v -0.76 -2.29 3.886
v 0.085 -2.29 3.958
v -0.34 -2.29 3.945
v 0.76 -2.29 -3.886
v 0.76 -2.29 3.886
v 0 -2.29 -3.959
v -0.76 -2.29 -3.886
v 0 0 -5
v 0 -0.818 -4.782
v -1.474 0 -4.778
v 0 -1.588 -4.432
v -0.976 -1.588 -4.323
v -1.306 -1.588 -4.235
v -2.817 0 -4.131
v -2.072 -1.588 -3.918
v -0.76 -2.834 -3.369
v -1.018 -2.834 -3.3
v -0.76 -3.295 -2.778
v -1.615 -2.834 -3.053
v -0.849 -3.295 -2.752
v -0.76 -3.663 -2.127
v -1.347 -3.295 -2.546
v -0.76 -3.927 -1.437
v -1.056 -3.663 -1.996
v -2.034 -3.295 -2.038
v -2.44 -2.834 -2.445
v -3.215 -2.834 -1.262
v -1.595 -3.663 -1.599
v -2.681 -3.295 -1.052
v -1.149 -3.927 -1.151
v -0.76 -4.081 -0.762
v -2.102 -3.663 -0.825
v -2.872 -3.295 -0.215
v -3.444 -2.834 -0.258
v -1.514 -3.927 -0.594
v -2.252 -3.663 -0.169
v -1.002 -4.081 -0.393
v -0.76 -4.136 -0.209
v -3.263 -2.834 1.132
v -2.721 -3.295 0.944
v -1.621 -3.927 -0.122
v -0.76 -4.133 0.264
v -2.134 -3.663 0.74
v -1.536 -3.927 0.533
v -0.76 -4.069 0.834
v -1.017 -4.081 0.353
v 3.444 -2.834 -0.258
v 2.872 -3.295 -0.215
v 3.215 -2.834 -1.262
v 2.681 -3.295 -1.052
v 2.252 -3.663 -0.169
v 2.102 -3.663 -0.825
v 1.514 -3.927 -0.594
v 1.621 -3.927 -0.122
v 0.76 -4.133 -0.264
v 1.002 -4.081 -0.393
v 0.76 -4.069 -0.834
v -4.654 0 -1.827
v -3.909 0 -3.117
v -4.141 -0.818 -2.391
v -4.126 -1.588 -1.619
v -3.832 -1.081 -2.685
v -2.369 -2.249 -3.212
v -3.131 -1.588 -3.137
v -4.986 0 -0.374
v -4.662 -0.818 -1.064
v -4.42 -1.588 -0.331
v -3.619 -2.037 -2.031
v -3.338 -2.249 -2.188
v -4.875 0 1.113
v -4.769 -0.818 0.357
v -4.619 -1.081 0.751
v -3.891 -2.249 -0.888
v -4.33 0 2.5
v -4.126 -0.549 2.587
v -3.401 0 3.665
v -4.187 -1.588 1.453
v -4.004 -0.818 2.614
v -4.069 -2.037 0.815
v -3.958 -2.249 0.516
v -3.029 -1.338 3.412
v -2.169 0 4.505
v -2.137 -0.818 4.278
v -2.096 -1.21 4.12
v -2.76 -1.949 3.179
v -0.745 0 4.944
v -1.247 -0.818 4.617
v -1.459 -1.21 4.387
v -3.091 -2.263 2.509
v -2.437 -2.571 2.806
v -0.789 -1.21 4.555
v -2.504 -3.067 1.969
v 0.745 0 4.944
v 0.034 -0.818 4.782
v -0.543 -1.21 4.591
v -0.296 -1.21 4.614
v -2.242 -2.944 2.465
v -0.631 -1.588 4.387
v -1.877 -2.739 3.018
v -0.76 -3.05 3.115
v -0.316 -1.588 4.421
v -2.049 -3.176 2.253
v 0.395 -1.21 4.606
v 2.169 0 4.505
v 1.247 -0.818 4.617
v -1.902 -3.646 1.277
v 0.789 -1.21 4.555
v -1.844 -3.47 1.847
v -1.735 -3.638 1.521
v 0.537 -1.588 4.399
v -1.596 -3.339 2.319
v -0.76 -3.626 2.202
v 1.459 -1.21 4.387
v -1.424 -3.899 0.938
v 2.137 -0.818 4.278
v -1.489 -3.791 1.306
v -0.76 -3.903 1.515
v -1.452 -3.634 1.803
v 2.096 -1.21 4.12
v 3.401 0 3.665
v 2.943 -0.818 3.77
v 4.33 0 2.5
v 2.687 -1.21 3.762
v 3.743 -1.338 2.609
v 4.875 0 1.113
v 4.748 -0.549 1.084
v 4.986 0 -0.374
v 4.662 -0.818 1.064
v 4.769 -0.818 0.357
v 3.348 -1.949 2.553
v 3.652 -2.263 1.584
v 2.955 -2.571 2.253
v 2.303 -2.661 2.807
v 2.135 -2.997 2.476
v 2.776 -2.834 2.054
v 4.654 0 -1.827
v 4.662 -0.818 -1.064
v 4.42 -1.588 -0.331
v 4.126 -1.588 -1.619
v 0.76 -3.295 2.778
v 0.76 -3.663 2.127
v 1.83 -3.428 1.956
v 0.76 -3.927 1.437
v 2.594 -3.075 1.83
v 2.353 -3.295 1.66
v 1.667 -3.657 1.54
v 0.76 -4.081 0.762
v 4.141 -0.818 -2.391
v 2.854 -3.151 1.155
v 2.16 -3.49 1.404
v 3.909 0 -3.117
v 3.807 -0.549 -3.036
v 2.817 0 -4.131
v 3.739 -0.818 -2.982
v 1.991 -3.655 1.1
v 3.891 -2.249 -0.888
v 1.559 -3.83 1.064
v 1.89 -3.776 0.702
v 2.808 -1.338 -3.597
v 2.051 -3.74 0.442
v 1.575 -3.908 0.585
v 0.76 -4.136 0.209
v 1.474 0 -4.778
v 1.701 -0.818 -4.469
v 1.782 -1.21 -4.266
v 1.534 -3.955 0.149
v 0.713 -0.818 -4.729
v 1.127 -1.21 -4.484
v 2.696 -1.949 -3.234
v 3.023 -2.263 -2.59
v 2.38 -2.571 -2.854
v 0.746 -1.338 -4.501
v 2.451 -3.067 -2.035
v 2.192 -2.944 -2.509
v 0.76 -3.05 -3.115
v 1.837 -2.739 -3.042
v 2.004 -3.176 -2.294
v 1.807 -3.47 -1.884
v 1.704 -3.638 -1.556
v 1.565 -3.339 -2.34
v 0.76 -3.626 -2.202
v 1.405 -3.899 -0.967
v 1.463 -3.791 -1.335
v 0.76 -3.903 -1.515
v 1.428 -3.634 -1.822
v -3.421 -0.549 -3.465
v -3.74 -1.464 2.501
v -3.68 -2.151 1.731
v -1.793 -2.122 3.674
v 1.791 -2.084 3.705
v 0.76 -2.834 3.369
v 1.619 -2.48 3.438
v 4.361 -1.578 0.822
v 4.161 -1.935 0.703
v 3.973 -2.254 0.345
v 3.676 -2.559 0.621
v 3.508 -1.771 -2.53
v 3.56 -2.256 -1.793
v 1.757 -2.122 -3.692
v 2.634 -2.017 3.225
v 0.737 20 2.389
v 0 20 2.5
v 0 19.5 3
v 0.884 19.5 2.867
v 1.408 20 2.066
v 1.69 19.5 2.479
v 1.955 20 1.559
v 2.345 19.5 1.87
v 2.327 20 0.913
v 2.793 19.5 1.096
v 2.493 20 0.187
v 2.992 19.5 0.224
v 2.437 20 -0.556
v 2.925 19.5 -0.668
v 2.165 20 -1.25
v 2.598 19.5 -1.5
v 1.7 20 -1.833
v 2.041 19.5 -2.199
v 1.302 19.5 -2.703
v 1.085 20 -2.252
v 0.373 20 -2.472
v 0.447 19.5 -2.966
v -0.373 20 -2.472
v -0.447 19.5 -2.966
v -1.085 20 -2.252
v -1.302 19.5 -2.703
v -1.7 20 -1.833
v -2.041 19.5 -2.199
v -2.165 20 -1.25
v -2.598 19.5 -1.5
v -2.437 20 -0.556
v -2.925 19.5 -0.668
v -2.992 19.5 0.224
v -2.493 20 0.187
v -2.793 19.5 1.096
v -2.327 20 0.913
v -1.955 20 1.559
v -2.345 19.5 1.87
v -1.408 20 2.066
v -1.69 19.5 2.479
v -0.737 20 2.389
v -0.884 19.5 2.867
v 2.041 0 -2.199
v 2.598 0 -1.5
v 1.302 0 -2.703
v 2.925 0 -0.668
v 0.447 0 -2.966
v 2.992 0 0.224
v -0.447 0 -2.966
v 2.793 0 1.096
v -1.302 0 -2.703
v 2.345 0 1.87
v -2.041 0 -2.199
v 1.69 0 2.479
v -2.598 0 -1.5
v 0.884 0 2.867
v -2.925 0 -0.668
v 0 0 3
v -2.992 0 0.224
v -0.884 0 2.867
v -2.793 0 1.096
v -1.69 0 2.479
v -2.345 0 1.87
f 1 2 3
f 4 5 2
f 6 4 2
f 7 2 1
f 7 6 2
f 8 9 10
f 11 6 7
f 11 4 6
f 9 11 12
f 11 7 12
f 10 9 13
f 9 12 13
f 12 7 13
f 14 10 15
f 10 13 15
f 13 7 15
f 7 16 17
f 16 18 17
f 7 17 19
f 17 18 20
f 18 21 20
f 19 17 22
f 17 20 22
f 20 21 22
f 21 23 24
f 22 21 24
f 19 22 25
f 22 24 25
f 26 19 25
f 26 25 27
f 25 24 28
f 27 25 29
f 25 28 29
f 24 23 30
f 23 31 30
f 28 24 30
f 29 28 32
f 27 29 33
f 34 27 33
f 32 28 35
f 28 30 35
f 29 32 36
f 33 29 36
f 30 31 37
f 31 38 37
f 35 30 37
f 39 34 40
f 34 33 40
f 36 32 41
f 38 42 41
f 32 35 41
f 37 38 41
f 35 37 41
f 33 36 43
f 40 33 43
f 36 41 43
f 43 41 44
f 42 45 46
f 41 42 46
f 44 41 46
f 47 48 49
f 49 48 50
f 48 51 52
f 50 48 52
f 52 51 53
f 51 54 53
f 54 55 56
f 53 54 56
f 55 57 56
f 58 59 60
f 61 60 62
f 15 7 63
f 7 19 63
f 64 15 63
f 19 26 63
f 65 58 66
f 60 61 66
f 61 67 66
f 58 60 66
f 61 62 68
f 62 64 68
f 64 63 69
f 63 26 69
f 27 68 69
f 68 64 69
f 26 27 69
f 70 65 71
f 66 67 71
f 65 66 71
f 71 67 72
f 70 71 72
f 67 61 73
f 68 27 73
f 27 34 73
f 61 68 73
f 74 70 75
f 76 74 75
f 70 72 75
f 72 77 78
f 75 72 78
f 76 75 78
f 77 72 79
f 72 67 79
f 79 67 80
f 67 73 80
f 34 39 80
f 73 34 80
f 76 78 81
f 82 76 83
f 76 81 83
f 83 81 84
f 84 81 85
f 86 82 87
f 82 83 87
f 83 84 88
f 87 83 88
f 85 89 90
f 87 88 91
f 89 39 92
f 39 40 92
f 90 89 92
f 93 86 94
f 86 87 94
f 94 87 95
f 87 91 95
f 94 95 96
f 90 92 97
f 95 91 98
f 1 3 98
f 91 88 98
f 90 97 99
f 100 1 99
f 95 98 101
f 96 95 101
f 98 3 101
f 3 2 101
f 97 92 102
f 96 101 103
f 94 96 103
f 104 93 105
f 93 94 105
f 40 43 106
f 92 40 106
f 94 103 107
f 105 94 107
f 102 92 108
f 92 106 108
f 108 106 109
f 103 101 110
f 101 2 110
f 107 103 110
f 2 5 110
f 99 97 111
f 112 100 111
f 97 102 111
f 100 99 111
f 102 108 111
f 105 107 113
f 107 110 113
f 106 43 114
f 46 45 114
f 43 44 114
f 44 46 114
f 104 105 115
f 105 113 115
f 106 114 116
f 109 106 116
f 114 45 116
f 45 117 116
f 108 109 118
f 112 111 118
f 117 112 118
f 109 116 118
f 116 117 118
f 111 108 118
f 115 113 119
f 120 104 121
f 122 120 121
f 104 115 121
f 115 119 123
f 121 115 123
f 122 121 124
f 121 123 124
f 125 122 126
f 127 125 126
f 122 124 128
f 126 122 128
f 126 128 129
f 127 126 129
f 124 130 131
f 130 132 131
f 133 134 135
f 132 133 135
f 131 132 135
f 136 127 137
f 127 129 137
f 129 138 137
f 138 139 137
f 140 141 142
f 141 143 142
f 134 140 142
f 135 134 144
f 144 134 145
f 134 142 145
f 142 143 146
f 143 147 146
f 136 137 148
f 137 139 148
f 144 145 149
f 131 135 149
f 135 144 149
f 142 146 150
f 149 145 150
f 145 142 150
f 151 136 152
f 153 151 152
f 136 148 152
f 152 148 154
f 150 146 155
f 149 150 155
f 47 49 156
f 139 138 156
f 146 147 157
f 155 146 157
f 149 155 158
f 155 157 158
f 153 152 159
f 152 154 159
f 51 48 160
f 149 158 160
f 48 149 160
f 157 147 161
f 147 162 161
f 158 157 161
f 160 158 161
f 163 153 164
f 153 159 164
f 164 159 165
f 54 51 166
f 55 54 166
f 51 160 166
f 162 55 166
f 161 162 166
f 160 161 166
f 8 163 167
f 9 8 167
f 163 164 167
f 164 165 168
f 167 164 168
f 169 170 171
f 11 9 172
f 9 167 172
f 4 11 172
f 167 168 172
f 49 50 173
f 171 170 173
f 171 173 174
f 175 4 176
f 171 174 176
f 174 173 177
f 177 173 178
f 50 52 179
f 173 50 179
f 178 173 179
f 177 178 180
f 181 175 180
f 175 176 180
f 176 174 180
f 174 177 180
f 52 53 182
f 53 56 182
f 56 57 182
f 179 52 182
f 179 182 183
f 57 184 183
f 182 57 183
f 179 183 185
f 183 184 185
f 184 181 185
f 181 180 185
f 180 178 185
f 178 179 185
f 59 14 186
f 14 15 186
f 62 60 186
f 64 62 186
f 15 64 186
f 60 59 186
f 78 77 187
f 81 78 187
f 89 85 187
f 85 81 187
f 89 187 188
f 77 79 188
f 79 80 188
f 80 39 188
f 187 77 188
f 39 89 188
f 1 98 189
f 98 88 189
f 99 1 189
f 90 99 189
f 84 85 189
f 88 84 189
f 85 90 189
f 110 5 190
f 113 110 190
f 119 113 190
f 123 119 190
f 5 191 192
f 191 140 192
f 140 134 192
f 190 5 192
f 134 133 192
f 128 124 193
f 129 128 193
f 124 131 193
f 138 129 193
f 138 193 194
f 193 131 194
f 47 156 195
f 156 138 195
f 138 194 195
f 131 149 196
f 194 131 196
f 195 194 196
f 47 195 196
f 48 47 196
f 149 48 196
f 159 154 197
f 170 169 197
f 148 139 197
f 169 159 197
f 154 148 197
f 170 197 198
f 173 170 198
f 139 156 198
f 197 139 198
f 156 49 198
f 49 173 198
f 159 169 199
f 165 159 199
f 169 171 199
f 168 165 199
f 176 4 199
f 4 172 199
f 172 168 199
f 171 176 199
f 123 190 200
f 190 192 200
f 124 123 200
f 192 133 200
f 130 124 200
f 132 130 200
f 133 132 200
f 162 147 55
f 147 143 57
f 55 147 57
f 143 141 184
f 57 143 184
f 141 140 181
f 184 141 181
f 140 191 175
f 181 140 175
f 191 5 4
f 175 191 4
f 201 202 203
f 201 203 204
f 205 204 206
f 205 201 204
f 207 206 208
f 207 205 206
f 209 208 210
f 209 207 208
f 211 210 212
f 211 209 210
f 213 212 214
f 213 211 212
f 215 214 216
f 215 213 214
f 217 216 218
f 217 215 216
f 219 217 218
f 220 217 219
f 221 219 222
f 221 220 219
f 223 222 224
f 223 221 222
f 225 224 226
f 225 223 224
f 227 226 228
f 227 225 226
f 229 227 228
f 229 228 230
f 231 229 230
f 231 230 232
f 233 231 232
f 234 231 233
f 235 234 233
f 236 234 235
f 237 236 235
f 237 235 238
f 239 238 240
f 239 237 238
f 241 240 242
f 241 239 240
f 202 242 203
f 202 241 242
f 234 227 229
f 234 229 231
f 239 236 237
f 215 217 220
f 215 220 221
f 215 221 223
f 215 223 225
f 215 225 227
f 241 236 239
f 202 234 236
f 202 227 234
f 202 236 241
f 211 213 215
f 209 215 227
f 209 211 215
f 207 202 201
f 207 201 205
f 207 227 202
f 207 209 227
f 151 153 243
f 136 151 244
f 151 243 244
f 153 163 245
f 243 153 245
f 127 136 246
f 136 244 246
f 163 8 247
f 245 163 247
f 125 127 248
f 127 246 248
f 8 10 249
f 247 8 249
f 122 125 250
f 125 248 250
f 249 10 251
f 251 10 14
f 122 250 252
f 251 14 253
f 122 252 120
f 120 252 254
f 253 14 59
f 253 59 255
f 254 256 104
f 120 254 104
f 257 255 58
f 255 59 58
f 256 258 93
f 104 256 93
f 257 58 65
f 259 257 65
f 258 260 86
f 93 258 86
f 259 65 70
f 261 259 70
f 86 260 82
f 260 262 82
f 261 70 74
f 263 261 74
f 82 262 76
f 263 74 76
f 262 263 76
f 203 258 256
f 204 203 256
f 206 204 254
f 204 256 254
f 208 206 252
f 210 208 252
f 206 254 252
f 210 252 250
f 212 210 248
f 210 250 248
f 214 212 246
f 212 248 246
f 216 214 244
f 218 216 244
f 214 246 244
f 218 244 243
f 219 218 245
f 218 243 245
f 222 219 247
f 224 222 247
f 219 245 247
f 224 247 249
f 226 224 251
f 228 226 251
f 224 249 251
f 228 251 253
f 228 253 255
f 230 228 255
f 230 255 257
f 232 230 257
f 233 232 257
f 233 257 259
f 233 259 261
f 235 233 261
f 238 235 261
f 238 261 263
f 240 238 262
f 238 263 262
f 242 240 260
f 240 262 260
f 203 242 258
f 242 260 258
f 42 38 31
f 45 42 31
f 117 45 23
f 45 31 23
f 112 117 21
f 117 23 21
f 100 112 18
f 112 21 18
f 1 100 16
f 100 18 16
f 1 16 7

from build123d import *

# Parameters (mm, degrees)
SKETCH1_R               = 3
BOSS_EXTRUDE1_DEPTH     = 20
CHAMFER1_SIZE           = 0.5
CUT_EXTRUDE1_DEPTH      = 22.213203483
CUT_EXTRUDE1_DEPTH_BACK = 22.213203483


with BuildPart() as part:
    # Sketch1 → Boss-Extrude1 (new body)
    with BuildSketch(Plane(origin=(0, 0, 0), x_dir=(1, 0, 0), z_dir=(0, 1, 0))):
        with Locations(Location((0, 0, 0), (0, 0, 270))):
            Circle(SKETCH1_R)
    extrude(amount=BOSS_EXTRUDE1_DEPTH)

    # Chamfer1
    chamfer1_edges = [part.edges().sort_by_distance(p)[0] for p in [
        (0, 20, -3),
    ]]
    chamfer(chamfer1_edges, length=CHAMFER1_SIZE)

    # Sketch2 → Revolve1 (revolve)
    with BuildSketch(Plane.XY, mode=Mode.PRIVATE) as revolve1_sk:
        with BuildLine():
            Line((0, 0), (-5, 0))
            ThreePointArc((-5, 0), (-3.260312474, -3.005133898), (0, -4.2))
            Line((0, -4.2), (0, 0))
        make_face()
    revolve(revolve1_sk.sketch.rotate(Axis((0, -4.2, 0), (0, 1, 0)), 270), axis=Axis((0, -4.2, 0), (0, 1, 0)))

    # Sketch3 → Cut-Extrude1 (cut, two sides: drawn at the far end of the back side and taken through both)
    with BuildSketch(Plane.XY.offset(-CUT_EXTRUDE1_DEPTH_BACK)):
        Polygon((-0.76031497, -2.29), (0, -2.29), (0.76031497, -2.29), (0.76031497, -6.2280618), (-0.76031497, -6.2280618), align=None)
    extrude(amount=CUT_EXTRUDE1_DEPTH + CUT_EXTRUDE1_DEPTH_BACK, mode=Mode.SUBTRACT)


solid = part.part
